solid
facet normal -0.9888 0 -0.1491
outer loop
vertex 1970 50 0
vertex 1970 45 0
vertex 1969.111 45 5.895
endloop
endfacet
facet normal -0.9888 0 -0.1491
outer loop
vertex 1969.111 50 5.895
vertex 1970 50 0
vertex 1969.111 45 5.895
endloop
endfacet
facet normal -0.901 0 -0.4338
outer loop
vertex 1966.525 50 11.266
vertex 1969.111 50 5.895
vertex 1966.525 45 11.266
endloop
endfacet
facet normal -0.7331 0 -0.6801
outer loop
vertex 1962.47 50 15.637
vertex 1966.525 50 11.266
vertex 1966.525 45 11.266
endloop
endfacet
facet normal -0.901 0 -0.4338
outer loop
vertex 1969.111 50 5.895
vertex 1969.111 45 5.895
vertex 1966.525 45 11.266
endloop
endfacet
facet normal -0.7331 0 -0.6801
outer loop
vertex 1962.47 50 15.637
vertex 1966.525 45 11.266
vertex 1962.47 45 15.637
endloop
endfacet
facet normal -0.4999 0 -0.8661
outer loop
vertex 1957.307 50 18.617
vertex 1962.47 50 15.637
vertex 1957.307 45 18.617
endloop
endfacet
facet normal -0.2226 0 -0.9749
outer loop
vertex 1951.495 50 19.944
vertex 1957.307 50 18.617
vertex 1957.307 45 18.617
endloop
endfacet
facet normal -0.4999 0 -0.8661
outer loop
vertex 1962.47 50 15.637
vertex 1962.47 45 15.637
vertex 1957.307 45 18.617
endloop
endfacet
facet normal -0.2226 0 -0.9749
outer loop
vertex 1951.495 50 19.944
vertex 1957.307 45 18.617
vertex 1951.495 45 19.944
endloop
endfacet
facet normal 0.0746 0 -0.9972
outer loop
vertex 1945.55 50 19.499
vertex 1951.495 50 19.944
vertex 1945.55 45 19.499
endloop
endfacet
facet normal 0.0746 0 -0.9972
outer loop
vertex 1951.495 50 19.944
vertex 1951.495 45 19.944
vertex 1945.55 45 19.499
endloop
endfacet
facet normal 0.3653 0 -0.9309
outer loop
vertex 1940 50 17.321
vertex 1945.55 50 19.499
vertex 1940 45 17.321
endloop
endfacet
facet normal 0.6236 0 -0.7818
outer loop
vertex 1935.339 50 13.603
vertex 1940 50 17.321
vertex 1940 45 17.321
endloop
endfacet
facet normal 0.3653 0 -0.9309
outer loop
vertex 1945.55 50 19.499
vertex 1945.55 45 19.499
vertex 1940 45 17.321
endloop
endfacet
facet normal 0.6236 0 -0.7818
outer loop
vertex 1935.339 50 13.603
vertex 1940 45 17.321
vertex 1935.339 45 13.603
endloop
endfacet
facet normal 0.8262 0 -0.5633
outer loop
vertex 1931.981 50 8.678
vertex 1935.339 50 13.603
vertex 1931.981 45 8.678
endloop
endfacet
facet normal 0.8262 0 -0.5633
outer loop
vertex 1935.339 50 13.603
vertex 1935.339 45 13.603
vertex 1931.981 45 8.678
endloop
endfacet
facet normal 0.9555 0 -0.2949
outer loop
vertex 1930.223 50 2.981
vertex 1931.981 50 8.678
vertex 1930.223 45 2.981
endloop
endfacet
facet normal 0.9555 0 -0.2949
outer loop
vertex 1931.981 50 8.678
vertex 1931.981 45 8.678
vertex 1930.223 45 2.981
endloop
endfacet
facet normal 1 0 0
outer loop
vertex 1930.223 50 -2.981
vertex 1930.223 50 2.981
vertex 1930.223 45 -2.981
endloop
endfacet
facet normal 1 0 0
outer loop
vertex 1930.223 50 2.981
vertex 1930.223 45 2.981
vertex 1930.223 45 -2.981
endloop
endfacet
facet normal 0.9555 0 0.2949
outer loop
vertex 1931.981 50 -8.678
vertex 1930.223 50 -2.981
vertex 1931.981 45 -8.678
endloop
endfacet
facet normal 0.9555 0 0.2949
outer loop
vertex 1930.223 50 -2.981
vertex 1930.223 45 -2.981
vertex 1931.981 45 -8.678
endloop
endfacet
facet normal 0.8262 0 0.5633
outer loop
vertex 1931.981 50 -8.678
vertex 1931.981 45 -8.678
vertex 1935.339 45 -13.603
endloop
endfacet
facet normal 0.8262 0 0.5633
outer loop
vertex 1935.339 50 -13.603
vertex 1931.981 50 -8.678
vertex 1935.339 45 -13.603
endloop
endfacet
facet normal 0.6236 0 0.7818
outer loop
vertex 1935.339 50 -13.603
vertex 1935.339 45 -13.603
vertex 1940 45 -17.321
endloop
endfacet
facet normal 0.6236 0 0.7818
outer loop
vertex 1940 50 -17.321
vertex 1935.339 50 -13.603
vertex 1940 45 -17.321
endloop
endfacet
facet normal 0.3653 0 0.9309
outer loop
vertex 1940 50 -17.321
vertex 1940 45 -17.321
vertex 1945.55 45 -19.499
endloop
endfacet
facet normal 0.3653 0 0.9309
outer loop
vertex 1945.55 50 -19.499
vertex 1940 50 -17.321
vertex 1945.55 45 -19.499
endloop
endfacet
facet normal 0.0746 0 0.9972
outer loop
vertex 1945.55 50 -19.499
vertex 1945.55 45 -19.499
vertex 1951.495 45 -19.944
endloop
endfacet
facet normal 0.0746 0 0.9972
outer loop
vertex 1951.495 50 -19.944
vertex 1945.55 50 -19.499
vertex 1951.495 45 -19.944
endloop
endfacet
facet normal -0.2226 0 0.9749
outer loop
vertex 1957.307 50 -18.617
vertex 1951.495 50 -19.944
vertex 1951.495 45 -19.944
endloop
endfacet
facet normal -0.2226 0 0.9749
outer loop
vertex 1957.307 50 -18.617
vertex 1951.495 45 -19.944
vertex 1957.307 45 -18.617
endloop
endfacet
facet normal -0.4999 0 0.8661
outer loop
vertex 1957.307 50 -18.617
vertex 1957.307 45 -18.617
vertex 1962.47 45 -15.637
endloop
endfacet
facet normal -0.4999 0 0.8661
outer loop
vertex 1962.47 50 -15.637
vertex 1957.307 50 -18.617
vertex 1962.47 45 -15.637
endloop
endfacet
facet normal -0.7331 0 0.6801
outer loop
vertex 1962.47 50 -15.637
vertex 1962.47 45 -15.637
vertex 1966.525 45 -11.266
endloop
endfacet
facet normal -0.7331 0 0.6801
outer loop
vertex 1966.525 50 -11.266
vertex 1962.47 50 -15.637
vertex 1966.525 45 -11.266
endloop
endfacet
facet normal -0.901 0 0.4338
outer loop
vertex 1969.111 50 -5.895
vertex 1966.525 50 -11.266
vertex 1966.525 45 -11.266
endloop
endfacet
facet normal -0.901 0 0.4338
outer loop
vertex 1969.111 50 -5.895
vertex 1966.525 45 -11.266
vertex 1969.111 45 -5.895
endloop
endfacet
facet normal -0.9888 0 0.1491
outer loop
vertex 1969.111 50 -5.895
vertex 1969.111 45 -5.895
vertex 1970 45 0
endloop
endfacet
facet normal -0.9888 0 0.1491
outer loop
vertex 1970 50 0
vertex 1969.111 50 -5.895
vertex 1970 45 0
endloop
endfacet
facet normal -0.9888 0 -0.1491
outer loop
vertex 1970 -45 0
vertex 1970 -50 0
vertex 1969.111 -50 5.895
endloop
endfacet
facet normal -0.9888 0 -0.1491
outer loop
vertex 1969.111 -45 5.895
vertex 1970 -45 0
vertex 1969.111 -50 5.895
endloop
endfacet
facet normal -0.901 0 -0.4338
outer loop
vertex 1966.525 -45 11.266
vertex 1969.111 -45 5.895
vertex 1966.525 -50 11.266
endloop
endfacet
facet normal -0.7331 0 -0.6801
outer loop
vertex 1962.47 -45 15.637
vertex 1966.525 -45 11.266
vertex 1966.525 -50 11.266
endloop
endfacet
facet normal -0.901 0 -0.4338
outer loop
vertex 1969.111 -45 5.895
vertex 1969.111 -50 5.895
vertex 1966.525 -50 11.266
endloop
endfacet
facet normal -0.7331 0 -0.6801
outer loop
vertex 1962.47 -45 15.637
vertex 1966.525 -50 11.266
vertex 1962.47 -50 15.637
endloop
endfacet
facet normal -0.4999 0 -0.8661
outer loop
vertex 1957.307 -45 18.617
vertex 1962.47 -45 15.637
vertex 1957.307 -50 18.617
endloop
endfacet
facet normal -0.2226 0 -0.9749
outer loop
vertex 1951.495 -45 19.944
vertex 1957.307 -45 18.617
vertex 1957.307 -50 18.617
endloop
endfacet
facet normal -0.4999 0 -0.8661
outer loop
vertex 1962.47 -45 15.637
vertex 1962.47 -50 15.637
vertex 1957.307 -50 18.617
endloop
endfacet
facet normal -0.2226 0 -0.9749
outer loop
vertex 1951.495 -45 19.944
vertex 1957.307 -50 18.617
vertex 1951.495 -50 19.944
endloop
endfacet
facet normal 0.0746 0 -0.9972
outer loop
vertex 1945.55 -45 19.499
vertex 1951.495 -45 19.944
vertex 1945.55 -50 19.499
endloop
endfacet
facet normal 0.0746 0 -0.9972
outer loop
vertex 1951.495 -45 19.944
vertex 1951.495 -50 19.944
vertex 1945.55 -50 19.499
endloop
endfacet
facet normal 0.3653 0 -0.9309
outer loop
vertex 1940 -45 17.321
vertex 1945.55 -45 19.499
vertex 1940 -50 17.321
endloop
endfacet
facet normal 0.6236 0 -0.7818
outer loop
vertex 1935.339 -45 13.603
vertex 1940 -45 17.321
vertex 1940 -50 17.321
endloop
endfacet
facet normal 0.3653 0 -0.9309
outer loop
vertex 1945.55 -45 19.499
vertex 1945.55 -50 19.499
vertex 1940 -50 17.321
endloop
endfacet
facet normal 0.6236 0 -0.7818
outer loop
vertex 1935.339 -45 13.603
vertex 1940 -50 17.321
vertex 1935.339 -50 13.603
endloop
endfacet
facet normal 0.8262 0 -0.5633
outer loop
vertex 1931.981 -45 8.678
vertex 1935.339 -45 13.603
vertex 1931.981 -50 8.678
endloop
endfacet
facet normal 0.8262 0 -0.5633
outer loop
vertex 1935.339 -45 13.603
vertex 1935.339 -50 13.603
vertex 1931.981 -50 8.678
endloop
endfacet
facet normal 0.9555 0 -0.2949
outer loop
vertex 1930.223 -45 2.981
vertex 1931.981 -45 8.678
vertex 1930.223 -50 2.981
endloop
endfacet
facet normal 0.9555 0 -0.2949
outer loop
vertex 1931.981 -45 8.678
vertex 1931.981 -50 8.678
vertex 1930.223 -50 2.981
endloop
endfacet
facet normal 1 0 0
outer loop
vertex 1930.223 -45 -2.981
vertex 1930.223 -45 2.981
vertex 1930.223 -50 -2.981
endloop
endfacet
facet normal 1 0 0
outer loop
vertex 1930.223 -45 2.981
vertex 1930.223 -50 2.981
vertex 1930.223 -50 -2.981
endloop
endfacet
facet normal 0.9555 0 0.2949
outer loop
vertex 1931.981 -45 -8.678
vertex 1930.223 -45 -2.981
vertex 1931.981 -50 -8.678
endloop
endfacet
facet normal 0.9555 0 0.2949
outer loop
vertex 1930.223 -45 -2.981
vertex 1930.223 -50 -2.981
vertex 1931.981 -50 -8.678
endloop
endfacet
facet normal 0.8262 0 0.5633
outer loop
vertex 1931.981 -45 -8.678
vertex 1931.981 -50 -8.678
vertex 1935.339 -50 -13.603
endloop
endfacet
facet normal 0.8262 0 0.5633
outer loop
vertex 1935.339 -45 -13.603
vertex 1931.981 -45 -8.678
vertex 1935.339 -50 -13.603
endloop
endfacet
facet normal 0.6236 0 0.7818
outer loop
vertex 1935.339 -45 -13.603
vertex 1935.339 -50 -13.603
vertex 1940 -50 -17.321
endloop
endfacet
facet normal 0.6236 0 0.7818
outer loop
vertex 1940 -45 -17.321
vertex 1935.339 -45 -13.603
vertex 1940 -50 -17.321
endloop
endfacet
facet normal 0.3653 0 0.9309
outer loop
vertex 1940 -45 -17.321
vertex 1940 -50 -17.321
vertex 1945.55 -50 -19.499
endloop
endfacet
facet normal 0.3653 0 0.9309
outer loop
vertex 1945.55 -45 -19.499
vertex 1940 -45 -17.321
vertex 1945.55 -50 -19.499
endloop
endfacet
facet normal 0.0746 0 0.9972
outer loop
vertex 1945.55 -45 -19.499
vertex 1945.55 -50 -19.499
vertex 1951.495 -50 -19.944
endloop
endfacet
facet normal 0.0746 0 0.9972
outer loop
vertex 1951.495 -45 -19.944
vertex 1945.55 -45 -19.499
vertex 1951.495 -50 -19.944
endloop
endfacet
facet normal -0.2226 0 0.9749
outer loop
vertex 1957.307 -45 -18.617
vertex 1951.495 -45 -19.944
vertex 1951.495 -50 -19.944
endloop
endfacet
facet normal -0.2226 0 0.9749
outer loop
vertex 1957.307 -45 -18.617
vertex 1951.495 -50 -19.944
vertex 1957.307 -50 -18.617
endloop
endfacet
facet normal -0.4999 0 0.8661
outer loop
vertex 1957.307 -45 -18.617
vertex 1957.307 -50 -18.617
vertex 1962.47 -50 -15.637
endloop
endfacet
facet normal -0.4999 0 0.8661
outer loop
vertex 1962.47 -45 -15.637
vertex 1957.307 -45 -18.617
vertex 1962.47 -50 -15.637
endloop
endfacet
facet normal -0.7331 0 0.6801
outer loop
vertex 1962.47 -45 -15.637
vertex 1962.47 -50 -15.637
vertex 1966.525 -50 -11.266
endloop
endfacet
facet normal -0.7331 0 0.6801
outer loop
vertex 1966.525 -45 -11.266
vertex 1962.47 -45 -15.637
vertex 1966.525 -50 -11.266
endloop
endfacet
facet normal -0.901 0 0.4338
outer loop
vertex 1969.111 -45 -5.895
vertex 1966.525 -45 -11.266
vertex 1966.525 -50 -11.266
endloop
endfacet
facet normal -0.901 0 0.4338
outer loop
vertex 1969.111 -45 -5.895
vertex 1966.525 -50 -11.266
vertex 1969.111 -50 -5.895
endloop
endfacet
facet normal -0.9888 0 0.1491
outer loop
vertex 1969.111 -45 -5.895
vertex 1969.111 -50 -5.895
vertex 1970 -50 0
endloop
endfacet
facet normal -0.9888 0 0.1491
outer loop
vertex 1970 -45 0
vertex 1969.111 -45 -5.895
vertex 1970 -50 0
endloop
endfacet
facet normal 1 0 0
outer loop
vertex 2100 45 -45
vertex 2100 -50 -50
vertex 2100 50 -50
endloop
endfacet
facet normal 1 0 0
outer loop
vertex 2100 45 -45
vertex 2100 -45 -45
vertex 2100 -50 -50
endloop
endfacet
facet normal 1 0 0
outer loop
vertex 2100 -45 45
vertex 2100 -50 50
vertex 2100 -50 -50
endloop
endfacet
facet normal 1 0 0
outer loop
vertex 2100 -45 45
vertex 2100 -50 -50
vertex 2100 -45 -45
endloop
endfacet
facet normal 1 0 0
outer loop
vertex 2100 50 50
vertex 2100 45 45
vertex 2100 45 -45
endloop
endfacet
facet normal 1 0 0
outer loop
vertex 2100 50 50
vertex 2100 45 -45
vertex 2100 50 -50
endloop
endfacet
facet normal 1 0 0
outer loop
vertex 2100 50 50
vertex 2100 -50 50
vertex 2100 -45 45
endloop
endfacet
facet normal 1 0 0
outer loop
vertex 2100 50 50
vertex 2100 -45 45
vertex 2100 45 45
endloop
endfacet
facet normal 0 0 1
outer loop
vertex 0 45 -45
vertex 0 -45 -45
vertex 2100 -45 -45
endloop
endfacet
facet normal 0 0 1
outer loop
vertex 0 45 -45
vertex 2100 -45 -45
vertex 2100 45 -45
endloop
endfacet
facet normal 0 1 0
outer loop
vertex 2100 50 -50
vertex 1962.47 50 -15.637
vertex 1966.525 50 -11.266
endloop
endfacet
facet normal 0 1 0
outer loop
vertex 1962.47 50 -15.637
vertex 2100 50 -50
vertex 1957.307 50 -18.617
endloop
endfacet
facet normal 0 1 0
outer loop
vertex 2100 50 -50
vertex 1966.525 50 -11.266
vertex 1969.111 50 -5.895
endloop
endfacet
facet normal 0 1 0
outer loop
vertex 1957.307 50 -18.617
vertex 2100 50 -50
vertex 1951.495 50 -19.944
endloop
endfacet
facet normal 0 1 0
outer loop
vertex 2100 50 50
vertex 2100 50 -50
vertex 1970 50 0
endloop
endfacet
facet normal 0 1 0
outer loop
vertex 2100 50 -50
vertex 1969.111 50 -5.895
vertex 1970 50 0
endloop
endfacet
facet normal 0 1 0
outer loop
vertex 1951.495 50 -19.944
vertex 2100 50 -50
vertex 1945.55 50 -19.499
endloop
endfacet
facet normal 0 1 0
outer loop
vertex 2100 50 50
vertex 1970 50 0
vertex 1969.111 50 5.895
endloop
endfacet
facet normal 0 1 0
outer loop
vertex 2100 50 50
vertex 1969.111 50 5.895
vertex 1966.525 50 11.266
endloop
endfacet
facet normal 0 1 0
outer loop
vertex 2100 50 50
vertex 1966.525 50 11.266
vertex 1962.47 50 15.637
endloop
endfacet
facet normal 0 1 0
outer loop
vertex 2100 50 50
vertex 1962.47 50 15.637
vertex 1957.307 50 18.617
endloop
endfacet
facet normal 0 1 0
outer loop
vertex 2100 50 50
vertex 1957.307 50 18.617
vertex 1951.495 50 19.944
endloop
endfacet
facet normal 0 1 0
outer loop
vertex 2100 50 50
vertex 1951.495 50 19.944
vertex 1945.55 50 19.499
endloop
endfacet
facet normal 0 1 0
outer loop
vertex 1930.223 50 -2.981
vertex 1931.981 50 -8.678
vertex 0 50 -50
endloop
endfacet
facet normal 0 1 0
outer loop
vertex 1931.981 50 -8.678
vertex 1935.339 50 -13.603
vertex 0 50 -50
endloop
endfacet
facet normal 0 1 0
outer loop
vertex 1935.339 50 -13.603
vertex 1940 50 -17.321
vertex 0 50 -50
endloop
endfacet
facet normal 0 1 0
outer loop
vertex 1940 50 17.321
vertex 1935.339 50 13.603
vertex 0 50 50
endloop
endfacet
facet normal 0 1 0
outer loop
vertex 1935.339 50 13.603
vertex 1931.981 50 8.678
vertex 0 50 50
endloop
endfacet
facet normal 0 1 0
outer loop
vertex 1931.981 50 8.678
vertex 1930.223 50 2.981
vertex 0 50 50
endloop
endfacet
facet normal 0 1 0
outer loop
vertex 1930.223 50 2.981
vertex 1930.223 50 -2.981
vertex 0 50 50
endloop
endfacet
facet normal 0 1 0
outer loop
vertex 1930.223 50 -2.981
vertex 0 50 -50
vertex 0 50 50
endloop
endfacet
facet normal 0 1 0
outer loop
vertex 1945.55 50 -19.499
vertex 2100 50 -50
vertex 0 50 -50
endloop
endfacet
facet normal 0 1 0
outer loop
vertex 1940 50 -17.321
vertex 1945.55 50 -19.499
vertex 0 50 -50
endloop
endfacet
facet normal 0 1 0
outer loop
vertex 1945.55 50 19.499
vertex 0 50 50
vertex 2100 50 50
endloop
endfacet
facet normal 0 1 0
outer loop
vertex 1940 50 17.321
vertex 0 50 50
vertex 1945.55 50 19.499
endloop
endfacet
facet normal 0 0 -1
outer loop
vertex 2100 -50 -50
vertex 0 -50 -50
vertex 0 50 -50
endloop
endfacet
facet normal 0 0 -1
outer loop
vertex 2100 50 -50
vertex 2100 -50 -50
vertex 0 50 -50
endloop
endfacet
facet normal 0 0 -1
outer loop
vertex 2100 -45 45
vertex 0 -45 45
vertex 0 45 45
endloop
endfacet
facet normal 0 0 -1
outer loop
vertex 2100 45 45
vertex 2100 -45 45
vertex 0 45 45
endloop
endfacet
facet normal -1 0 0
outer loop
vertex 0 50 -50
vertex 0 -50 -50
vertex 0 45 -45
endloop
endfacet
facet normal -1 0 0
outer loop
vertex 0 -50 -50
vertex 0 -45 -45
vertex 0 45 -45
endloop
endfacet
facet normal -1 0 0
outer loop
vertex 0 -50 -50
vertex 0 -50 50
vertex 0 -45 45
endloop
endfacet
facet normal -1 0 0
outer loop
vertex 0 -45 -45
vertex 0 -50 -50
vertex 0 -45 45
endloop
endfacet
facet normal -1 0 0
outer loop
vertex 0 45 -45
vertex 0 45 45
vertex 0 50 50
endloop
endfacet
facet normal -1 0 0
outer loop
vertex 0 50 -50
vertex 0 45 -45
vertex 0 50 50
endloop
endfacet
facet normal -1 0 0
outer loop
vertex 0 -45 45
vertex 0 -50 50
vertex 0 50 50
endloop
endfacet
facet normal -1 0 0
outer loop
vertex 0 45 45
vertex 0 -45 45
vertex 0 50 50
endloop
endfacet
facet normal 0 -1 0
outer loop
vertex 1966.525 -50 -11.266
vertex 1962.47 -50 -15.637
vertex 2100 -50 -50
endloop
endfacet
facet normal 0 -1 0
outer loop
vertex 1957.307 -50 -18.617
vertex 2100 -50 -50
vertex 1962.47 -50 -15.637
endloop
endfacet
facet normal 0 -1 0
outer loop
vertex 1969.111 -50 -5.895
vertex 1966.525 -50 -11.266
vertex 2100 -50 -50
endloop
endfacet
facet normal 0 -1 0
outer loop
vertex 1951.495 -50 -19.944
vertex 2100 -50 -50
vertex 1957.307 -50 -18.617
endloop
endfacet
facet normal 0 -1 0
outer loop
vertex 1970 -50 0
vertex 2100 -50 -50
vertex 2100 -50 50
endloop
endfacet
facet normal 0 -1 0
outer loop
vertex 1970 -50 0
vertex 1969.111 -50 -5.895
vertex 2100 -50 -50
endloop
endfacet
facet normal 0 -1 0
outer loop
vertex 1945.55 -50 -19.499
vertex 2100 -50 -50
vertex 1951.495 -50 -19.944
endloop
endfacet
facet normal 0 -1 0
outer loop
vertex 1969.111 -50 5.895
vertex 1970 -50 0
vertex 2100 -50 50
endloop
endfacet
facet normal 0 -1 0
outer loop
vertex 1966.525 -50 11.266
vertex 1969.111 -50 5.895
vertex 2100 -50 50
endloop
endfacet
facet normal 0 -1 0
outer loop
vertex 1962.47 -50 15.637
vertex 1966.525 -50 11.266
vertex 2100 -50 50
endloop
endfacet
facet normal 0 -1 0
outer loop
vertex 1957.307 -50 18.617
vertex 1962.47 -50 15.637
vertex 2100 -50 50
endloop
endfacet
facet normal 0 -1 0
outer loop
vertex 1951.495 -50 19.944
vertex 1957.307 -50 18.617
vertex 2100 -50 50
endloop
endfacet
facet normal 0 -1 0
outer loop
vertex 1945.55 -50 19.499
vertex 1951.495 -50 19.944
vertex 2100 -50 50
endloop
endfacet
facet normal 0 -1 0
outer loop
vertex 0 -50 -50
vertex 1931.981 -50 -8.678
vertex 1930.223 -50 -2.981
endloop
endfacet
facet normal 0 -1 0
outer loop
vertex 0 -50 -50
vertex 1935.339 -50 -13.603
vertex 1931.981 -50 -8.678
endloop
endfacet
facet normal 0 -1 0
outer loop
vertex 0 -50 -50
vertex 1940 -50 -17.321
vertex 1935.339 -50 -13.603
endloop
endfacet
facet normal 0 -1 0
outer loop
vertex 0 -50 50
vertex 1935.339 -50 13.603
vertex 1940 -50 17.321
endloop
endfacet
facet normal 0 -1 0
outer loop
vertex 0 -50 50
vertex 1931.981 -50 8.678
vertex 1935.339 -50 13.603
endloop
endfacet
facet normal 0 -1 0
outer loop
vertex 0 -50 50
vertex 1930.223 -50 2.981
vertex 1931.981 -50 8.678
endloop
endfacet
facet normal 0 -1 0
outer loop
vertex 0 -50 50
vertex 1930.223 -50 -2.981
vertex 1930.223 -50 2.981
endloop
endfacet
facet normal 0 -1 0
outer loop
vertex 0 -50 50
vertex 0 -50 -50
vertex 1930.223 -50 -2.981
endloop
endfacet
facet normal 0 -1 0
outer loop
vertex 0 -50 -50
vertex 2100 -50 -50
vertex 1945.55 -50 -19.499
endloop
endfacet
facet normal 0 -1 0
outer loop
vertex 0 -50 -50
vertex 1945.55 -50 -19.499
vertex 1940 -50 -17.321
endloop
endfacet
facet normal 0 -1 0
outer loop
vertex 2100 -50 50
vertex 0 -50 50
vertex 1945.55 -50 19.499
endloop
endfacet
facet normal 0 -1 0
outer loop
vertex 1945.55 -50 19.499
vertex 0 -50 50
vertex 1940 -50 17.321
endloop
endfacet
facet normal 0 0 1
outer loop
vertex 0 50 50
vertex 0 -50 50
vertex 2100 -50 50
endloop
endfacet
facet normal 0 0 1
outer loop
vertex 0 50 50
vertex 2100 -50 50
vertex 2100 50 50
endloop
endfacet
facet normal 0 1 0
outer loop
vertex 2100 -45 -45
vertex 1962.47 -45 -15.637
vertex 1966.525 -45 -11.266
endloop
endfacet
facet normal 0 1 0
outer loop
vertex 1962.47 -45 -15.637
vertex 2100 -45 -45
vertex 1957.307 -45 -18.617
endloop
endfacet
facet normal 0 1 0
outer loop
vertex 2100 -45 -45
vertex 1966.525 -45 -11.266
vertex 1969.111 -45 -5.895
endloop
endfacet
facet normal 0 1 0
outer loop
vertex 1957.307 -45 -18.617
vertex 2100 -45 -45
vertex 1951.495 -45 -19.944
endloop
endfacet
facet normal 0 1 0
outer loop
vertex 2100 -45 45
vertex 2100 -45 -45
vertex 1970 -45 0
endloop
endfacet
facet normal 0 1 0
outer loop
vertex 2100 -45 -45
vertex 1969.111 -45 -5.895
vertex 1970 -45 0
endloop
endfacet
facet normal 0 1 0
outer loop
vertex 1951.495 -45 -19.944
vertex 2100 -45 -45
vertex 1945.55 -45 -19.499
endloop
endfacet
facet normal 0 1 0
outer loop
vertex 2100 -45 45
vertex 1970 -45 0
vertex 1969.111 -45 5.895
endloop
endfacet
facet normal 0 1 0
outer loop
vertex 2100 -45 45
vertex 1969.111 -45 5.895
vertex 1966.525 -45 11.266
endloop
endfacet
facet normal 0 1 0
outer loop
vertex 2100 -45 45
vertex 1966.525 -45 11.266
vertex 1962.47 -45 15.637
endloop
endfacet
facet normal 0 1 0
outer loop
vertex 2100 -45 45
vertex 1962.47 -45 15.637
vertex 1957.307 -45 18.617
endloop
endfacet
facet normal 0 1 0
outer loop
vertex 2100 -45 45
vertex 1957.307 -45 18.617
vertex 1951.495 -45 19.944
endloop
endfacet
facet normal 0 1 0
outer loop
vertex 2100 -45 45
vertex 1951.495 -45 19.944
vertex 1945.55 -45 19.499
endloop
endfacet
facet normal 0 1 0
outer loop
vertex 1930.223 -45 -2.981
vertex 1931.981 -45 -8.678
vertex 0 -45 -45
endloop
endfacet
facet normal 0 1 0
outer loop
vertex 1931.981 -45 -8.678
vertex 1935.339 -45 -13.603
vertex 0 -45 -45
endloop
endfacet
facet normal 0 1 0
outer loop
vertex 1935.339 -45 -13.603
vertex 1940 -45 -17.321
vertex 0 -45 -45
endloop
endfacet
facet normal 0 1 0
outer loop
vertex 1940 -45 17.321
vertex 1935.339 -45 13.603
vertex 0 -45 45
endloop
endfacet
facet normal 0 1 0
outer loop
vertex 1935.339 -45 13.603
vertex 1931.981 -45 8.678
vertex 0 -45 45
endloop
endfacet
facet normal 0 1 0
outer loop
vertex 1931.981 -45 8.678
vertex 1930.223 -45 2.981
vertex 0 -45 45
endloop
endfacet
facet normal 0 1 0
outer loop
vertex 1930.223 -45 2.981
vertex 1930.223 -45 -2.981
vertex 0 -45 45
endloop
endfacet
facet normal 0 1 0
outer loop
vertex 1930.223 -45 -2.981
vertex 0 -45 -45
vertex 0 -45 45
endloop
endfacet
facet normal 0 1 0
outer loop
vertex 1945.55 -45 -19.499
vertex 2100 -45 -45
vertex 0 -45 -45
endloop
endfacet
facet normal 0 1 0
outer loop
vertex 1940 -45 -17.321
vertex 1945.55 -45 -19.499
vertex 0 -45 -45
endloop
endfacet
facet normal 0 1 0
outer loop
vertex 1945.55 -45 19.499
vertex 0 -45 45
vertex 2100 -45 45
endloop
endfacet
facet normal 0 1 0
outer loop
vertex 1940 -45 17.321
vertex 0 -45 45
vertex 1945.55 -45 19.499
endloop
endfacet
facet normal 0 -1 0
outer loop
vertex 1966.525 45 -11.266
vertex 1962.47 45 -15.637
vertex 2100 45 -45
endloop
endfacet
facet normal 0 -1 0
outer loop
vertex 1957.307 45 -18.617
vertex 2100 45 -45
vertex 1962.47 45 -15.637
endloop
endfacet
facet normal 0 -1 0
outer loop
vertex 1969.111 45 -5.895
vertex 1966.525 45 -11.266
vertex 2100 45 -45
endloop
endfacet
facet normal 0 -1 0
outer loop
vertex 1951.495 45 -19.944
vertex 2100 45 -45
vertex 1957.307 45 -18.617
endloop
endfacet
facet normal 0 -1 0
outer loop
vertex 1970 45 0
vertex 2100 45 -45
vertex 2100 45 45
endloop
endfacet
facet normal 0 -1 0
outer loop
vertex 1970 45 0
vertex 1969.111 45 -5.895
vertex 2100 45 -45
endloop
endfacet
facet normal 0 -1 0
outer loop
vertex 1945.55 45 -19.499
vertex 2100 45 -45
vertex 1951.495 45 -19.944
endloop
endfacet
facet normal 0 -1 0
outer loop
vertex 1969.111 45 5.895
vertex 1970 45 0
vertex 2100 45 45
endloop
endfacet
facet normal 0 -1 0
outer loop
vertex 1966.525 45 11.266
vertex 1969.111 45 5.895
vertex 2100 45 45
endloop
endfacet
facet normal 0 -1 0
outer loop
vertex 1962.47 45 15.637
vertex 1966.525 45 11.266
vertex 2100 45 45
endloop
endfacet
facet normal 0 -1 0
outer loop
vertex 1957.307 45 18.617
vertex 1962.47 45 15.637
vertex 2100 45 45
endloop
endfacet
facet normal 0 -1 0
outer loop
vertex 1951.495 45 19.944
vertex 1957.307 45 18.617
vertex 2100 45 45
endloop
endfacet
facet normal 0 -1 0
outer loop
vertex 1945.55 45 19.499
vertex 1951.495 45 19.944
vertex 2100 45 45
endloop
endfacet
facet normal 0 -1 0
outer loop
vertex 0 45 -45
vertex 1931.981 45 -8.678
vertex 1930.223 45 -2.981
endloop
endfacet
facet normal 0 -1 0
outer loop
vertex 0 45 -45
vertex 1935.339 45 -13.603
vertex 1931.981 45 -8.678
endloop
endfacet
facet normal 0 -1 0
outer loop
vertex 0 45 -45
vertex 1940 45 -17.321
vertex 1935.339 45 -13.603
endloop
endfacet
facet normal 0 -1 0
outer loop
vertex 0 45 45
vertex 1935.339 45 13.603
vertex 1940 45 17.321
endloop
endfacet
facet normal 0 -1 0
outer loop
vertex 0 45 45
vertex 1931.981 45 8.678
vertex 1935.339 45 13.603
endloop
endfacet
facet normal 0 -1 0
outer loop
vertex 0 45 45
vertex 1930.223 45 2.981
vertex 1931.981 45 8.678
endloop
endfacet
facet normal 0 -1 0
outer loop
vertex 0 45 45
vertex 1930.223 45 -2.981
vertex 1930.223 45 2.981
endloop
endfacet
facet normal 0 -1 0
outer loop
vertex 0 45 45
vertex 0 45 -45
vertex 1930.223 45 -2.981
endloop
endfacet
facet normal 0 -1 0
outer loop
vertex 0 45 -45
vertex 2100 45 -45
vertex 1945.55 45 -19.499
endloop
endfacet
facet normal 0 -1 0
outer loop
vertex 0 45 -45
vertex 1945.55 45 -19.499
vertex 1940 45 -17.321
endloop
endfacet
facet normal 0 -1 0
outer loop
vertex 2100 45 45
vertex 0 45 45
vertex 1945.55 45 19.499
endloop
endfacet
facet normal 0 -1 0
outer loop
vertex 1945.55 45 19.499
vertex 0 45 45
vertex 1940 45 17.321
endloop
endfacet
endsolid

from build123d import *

# Parameters (mm, degrees)
F0_W     = 100
F0_H     = 100
F0_W_2   = 90
F0_H_2   = 90
F1_DEPTH = 2100
F2_R     = 20
F3_DEPTH = 100


with BuildPart() as f1:
    # F0 (on Right) → F1 (new body)
    with BuildSketch(Plane.YZ):
        Rectangle(F0_W, F0_H)
        Rectangle(F0_W_2, F0_H_2, mode=Mode.SUBTRACT)
    extrude(amount=F1_DEPTH)

    # F2 (on face) → F3 (cut)
    with BuildSketch(Plane.XZ.offset(50)):
        with Locations((1950, 0)):
            Circle(F2_R)
    extrude(amount=-F3_DEPTH, mode=Mode.SUBTRACT)


solid = f1.part
